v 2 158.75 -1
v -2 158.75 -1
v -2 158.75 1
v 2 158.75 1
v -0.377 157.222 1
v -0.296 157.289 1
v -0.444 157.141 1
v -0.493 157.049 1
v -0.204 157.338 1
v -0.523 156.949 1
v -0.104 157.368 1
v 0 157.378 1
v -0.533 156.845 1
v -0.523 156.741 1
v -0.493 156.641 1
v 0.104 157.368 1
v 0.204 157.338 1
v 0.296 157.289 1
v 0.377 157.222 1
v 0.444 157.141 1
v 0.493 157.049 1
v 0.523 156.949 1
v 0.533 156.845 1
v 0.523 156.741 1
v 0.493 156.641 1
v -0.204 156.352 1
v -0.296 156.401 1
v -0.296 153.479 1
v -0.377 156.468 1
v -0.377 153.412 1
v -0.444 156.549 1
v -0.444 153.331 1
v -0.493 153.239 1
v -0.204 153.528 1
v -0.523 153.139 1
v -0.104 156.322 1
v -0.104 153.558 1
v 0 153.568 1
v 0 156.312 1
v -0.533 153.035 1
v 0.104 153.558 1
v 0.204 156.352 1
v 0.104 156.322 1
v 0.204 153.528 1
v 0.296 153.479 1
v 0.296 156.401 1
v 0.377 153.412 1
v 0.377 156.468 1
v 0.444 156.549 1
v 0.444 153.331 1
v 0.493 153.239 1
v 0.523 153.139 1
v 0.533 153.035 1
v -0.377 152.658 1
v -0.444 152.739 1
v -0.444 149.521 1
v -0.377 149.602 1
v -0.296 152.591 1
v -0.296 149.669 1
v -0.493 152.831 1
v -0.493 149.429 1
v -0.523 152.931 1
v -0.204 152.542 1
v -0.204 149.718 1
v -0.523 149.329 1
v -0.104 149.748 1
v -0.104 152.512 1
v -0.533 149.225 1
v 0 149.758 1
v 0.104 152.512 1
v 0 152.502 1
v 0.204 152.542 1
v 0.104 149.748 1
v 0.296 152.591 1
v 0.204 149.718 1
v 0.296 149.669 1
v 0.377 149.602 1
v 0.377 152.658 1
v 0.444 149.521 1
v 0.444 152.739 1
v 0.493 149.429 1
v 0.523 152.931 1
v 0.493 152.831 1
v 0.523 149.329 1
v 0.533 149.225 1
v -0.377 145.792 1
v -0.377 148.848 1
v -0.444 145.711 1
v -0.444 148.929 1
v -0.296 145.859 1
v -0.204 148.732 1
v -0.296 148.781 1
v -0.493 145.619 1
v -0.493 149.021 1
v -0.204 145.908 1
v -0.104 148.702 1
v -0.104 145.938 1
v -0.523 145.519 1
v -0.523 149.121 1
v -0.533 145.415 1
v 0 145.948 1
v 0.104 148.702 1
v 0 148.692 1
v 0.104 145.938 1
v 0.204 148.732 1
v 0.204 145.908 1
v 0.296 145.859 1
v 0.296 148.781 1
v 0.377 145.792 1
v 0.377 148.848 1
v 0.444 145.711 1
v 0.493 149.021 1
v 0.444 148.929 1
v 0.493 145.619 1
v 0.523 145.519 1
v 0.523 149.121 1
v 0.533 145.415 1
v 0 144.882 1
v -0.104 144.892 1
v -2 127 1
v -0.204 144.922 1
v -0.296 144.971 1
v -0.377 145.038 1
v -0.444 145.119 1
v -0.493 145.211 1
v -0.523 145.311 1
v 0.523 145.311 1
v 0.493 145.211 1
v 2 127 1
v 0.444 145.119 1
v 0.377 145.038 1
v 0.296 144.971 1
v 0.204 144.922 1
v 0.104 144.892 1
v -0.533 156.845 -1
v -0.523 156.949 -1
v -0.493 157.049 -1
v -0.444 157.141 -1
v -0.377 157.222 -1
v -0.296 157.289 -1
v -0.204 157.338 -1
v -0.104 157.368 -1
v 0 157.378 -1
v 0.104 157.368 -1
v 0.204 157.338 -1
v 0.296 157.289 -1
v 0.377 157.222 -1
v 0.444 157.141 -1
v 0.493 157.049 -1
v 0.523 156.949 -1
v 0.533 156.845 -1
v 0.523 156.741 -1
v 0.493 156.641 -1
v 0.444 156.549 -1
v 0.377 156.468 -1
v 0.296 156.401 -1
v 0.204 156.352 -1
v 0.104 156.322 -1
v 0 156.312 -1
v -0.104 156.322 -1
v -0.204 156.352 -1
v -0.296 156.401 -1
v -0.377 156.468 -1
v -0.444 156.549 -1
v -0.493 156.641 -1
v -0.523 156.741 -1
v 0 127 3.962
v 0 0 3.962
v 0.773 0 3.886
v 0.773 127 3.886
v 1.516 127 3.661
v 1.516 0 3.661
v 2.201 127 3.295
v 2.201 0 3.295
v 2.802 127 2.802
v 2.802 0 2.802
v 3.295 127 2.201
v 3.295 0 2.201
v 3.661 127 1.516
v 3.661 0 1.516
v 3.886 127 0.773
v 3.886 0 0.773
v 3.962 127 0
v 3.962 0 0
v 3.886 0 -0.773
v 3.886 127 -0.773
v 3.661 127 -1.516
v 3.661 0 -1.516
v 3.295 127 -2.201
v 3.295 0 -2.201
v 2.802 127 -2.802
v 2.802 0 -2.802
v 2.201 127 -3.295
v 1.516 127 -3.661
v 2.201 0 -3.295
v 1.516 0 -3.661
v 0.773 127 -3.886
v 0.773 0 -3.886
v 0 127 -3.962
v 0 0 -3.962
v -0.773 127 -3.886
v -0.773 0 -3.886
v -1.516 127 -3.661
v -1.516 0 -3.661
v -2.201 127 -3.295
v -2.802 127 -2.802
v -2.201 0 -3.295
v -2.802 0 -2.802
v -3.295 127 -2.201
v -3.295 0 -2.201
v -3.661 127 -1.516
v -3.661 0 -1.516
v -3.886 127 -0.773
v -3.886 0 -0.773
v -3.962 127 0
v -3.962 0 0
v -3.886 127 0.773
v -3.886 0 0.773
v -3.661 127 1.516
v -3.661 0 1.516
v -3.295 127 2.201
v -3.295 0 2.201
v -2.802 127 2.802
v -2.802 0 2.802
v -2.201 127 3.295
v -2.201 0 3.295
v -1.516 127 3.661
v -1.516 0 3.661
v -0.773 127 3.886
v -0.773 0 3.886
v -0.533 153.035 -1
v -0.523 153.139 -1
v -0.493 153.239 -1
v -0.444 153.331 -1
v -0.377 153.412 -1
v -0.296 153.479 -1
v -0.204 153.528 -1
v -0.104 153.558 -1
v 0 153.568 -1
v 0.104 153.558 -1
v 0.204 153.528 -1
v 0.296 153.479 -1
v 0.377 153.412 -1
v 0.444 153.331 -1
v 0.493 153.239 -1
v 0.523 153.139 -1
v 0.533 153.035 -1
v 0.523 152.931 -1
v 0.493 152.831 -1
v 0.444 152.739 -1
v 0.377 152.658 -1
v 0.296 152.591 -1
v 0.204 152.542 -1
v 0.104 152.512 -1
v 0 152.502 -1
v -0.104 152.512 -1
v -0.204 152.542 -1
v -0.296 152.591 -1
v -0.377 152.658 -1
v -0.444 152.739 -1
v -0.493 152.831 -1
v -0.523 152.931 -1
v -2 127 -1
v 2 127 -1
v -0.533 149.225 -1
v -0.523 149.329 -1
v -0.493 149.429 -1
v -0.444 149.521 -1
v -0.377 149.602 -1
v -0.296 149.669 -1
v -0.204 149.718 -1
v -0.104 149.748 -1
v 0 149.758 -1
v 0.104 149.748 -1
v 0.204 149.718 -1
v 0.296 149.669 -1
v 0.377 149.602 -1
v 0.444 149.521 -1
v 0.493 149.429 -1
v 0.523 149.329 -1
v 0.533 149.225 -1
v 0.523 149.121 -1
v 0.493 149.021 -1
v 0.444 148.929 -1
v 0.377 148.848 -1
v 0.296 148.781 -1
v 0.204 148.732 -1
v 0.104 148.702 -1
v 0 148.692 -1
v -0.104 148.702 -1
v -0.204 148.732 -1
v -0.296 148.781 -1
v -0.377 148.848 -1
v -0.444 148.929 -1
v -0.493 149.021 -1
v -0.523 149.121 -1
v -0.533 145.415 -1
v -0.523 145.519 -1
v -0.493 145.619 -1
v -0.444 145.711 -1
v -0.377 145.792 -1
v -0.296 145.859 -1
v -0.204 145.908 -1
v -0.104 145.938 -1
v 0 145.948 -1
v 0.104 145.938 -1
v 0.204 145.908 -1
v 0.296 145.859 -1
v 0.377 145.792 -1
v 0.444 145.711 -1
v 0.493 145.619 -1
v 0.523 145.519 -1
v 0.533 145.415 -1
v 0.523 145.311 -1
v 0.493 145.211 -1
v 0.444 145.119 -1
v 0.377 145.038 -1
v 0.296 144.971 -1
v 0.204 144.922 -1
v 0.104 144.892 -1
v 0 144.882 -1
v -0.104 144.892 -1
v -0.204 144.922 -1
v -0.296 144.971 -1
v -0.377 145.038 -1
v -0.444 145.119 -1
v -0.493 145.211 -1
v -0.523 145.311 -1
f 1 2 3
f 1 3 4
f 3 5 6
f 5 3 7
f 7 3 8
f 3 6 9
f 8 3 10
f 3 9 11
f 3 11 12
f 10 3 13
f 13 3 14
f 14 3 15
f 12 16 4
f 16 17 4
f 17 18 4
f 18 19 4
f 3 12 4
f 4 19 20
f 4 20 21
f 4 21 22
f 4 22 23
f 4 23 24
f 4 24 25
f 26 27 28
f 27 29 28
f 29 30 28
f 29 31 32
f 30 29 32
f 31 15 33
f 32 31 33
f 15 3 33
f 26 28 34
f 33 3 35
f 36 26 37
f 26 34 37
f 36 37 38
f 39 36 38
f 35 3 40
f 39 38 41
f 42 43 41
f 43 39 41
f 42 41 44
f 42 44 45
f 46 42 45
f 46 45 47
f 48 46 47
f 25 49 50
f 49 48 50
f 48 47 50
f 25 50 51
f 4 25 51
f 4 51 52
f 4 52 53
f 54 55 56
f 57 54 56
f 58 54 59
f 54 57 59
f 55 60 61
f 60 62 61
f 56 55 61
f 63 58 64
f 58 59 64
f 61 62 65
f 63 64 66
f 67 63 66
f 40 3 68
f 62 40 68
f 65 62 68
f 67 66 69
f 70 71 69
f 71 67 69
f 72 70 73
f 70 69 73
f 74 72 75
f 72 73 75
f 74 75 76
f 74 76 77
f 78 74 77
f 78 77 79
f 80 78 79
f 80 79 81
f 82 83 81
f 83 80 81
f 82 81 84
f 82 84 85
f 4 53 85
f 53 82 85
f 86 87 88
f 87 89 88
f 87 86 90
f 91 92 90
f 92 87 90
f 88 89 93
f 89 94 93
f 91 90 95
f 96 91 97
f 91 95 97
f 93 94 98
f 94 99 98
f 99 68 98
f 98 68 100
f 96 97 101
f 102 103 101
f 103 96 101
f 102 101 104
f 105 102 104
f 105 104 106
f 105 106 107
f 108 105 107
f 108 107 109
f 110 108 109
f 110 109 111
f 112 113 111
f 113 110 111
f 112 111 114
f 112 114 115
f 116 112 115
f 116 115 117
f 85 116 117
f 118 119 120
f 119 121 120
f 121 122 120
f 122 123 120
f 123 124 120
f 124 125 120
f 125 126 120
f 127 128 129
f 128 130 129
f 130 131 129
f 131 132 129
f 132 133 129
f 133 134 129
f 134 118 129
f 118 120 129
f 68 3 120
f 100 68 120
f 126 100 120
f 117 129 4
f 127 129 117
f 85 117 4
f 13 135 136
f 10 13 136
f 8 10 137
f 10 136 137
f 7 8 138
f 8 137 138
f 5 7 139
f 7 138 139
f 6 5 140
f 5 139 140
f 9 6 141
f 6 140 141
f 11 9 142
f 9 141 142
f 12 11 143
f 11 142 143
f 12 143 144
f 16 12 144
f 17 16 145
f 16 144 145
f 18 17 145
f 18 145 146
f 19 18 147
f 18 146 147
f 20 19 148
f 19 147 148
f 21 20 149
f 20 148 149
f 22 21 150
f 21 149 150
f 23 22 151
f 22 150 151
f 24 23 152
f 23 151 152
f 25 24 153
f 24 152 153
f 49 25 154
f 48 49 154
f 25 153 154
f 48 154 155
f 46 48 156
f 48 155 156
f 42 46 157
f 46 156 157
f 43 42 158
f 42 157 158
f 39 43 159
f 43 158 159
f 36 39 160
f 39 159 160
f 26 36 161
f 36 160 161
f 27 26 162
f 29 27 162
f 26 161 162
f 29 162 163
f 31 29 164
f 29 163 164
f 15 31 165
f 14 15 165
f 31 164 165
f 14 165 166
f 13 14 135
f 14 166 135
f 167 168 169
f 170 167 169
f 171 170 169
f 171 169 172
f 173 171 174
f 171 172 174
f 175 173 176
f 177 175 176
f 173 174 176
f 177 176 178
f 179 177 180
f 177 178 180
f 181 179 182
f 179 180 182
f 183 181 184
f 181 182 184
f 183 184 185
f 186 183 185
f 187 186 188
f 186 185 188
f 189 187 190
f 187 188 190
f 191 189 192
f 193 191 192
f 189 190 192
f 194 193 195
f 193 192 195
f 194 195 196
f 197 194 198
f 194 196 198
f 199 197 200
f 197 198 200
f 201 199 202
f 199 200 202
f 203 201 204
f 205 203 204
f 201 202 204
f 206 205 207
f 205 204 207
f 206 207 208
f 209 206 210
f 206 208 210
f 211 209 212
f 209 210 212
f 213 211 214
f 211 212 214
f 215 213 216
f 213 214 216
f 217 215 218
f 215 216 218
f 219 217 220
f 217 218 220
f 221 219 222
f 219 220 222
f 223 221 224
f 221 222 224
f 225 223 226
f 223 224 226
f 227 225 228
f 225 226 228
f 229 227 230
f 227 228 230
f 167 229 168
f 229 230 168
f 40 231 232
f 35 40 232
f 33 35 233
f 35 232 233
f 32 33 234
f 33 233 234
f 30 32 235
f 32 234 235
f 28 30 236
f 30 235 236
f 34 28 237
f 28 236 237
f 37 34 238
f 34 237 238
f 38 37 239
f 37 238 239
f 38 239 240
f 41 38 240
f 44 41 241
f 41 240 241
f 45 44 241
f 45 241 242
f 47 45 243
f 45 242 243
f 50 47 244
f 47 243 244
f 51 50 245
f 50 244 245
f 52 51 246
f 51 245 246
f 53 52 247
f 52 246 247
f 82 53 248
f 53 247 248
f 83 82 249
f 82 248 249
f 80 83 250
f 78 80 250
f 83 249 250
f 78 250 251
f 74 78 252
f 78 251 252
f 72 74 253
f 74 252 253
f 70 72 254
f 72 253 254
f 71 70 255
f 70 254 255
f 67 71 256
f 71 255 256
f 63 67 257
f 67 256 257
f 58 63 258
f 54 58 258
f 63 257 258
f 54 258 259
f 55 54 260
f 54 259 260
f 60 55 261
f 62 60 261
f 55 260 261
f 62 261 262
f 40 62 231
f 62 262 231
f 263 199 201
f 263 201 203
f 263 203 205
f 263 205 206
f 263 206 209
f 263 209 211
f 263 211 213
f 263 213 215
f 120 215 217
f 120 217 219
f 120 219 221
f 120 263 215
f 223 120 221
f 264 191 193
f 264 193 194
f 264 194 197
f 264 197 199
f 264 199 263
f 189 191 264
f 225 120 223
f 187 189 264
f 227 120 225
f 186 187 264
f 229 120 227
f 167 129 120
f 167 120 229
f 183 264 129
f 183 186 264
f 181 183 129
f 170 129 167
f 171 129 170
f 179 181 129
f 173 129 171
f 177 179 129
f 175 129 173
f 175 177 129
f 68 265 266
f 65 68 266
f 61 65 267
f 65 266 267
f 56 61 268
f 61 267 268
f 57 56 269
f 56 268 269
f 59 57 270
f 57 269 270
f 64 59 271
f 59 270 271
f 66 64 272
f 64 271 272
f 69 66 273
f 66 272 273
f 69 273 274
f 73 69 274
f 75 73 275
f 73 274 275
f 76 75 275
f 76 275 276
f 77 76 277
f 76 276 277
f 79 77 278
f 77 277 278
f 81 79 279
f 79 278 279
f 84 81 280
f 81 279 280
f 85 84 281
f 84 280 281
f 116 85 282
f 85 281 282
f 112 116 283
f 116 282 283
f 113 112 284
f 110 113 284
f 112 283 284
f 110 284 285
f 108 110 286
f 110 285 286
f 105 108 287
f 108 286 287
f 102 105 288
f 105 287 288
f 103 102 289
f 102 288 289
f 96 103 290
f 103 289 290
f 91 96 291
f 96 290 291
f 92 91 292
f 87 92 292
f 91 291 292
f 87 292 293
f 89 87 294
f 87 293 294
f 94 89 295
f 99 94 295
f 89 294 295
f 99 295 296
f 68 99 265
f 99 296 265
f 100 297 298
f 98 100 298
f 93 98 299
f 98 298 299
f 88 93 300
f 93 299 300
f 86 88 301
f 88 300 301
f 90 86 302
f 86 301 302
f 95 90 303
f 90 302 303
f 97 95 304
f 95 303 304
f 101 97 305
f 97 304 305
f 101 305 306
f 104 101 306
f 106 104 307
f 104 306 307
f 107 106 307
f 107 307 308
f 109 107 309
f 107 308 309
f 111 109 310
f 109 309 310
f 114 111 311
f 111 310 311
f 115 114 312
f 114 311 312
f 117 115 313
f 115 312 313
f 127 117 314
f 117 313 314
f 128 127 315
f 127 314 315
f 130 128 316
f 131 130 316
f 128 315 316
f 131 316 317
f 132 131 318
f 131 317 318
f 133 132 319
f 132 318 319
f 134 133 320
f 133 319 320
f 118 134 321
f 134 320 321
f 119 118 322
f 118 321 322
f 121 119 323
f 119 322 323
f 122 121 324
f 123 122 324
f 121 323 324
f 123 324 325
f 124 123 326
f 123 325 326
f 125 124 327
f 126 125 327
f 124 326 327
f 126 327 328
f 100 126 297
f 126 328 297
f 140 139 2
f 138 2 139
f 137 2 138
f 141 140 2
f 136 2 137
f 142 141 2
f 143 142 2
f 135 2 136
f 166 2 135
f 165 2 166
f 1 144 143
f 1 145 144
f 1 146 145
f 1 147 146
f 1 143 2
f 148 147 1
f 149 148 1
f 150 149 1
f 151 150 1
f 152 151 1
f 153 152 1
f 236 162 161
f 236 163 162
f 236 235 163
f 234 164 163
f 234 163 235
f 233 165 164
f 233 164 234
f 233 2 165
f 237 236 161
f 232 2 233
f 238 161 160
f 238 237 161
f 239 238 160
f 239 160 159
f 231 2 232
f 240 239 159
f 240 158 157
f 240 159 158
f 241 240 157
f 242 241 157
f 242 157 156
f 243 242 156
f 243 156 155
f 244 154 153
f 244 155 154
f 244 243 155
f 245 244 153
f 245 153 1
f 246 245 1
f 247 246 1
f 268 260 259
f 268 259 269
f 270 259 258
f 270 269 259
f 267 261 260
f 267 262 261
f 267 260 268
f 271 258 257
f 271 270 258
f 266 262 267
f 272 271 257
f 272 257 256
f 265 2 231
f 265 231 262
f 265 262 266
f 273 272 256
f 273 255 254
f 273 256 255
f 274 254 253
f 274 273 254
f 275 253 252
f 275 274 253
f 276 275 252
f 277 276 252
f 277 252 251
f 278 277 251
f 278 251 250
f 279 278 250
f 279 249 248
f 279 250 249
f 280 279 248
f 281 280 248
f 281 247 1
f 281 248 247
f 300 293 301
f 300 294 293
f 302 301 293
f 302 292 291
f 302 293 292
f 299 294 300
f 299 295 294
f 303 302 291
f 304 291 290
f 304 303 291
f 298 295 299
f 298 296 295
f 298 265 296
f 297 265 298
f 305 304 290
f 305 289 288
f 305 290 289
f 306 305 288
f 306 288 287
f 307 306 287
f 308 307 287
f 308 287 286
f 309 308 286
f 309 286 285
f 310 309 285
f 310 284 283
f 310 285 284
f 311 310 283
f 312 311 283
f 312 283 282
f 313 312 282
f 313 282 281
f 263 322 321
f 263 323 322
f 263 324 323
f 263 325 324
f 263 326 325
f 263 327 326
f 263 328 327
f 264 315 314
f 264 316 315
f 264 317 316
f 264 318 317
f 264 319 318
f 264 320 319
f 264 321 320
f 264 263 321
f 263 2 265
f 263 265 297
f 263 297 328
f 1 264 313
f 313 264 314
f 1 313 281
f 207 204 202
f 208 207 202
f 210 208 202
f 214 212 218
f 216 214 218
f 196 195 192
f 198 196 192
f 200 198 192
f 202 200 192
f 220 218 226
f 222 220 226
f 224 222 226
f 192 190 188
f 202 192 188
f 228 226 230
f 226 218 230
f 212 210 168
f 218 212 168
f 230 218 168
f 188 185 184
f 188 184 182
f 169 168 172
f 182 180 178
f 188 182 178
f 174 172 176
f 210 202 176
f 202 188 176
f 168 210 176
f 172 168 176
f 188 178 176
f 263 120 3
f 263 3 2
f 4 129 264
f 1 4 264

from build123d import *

# Parameters (mm, degrees)
SKETCH1_R           = 3.9624
BOSS_EXTRUDE1_DEPTH = 127
SKETCH4_W           = 4.000000128
SKETCH4_H           = 2
BOSS_EXTRUDE2_DEPTH = 31.75
SKETCH5_R           = 0.5334
CUT_EXTRUDE1_DEPTH  = 2


with BuildPart() as part:
    # Sketch1 → Boss-Extrude1 (new body)
    with BuildSketch(Plane(origin=(0, 0, 0), x_dir=(1, 0, 0), z_dir=(0, 1, 0))):
        with Locations(Location((0, 0, 0), (0, 0, 270))):
            Circle(SKETCH1_R)
    extrude(amount=BOSS_EXTRUDE1_DEPTH)

    # Sketch4 → Boss-Extrude2 (add)
    with BuildSketch(Plane(origin=(0, 127, 0), x_dir=(1, 0, 0), z_dir=(0, 1, 0))):
        with Locations((6.4e-08, 0)):
            Rectangle(SKETCH4_W, SKETCH4_H)
    extrude(amount=BOSS_EXTRUDE2_DEPTH)

    # Sketch5 → Cut-Extrude1 (cut)
    with BuildSketch(Plane(origin=(0, 0, -1), x_dir=(-1, 0, 0), z_dir=(0, 0, -1))):
        with Locations((0, 156.845)):
            Circle(SKETCH5_R)
        with Locations((0, 153.035)):
            Circle(SKETCH5_R)
        with Locations((0, 149.225)):
            Circle(SKETCH5_R)
        with Locations((0, 145.415)):
            Circle(SKETCH5_R)
    extrude(amount=-CUT_EXTRUDE1_DEPTH, mode=Mode.SUBTRACT)


solid = part.part
